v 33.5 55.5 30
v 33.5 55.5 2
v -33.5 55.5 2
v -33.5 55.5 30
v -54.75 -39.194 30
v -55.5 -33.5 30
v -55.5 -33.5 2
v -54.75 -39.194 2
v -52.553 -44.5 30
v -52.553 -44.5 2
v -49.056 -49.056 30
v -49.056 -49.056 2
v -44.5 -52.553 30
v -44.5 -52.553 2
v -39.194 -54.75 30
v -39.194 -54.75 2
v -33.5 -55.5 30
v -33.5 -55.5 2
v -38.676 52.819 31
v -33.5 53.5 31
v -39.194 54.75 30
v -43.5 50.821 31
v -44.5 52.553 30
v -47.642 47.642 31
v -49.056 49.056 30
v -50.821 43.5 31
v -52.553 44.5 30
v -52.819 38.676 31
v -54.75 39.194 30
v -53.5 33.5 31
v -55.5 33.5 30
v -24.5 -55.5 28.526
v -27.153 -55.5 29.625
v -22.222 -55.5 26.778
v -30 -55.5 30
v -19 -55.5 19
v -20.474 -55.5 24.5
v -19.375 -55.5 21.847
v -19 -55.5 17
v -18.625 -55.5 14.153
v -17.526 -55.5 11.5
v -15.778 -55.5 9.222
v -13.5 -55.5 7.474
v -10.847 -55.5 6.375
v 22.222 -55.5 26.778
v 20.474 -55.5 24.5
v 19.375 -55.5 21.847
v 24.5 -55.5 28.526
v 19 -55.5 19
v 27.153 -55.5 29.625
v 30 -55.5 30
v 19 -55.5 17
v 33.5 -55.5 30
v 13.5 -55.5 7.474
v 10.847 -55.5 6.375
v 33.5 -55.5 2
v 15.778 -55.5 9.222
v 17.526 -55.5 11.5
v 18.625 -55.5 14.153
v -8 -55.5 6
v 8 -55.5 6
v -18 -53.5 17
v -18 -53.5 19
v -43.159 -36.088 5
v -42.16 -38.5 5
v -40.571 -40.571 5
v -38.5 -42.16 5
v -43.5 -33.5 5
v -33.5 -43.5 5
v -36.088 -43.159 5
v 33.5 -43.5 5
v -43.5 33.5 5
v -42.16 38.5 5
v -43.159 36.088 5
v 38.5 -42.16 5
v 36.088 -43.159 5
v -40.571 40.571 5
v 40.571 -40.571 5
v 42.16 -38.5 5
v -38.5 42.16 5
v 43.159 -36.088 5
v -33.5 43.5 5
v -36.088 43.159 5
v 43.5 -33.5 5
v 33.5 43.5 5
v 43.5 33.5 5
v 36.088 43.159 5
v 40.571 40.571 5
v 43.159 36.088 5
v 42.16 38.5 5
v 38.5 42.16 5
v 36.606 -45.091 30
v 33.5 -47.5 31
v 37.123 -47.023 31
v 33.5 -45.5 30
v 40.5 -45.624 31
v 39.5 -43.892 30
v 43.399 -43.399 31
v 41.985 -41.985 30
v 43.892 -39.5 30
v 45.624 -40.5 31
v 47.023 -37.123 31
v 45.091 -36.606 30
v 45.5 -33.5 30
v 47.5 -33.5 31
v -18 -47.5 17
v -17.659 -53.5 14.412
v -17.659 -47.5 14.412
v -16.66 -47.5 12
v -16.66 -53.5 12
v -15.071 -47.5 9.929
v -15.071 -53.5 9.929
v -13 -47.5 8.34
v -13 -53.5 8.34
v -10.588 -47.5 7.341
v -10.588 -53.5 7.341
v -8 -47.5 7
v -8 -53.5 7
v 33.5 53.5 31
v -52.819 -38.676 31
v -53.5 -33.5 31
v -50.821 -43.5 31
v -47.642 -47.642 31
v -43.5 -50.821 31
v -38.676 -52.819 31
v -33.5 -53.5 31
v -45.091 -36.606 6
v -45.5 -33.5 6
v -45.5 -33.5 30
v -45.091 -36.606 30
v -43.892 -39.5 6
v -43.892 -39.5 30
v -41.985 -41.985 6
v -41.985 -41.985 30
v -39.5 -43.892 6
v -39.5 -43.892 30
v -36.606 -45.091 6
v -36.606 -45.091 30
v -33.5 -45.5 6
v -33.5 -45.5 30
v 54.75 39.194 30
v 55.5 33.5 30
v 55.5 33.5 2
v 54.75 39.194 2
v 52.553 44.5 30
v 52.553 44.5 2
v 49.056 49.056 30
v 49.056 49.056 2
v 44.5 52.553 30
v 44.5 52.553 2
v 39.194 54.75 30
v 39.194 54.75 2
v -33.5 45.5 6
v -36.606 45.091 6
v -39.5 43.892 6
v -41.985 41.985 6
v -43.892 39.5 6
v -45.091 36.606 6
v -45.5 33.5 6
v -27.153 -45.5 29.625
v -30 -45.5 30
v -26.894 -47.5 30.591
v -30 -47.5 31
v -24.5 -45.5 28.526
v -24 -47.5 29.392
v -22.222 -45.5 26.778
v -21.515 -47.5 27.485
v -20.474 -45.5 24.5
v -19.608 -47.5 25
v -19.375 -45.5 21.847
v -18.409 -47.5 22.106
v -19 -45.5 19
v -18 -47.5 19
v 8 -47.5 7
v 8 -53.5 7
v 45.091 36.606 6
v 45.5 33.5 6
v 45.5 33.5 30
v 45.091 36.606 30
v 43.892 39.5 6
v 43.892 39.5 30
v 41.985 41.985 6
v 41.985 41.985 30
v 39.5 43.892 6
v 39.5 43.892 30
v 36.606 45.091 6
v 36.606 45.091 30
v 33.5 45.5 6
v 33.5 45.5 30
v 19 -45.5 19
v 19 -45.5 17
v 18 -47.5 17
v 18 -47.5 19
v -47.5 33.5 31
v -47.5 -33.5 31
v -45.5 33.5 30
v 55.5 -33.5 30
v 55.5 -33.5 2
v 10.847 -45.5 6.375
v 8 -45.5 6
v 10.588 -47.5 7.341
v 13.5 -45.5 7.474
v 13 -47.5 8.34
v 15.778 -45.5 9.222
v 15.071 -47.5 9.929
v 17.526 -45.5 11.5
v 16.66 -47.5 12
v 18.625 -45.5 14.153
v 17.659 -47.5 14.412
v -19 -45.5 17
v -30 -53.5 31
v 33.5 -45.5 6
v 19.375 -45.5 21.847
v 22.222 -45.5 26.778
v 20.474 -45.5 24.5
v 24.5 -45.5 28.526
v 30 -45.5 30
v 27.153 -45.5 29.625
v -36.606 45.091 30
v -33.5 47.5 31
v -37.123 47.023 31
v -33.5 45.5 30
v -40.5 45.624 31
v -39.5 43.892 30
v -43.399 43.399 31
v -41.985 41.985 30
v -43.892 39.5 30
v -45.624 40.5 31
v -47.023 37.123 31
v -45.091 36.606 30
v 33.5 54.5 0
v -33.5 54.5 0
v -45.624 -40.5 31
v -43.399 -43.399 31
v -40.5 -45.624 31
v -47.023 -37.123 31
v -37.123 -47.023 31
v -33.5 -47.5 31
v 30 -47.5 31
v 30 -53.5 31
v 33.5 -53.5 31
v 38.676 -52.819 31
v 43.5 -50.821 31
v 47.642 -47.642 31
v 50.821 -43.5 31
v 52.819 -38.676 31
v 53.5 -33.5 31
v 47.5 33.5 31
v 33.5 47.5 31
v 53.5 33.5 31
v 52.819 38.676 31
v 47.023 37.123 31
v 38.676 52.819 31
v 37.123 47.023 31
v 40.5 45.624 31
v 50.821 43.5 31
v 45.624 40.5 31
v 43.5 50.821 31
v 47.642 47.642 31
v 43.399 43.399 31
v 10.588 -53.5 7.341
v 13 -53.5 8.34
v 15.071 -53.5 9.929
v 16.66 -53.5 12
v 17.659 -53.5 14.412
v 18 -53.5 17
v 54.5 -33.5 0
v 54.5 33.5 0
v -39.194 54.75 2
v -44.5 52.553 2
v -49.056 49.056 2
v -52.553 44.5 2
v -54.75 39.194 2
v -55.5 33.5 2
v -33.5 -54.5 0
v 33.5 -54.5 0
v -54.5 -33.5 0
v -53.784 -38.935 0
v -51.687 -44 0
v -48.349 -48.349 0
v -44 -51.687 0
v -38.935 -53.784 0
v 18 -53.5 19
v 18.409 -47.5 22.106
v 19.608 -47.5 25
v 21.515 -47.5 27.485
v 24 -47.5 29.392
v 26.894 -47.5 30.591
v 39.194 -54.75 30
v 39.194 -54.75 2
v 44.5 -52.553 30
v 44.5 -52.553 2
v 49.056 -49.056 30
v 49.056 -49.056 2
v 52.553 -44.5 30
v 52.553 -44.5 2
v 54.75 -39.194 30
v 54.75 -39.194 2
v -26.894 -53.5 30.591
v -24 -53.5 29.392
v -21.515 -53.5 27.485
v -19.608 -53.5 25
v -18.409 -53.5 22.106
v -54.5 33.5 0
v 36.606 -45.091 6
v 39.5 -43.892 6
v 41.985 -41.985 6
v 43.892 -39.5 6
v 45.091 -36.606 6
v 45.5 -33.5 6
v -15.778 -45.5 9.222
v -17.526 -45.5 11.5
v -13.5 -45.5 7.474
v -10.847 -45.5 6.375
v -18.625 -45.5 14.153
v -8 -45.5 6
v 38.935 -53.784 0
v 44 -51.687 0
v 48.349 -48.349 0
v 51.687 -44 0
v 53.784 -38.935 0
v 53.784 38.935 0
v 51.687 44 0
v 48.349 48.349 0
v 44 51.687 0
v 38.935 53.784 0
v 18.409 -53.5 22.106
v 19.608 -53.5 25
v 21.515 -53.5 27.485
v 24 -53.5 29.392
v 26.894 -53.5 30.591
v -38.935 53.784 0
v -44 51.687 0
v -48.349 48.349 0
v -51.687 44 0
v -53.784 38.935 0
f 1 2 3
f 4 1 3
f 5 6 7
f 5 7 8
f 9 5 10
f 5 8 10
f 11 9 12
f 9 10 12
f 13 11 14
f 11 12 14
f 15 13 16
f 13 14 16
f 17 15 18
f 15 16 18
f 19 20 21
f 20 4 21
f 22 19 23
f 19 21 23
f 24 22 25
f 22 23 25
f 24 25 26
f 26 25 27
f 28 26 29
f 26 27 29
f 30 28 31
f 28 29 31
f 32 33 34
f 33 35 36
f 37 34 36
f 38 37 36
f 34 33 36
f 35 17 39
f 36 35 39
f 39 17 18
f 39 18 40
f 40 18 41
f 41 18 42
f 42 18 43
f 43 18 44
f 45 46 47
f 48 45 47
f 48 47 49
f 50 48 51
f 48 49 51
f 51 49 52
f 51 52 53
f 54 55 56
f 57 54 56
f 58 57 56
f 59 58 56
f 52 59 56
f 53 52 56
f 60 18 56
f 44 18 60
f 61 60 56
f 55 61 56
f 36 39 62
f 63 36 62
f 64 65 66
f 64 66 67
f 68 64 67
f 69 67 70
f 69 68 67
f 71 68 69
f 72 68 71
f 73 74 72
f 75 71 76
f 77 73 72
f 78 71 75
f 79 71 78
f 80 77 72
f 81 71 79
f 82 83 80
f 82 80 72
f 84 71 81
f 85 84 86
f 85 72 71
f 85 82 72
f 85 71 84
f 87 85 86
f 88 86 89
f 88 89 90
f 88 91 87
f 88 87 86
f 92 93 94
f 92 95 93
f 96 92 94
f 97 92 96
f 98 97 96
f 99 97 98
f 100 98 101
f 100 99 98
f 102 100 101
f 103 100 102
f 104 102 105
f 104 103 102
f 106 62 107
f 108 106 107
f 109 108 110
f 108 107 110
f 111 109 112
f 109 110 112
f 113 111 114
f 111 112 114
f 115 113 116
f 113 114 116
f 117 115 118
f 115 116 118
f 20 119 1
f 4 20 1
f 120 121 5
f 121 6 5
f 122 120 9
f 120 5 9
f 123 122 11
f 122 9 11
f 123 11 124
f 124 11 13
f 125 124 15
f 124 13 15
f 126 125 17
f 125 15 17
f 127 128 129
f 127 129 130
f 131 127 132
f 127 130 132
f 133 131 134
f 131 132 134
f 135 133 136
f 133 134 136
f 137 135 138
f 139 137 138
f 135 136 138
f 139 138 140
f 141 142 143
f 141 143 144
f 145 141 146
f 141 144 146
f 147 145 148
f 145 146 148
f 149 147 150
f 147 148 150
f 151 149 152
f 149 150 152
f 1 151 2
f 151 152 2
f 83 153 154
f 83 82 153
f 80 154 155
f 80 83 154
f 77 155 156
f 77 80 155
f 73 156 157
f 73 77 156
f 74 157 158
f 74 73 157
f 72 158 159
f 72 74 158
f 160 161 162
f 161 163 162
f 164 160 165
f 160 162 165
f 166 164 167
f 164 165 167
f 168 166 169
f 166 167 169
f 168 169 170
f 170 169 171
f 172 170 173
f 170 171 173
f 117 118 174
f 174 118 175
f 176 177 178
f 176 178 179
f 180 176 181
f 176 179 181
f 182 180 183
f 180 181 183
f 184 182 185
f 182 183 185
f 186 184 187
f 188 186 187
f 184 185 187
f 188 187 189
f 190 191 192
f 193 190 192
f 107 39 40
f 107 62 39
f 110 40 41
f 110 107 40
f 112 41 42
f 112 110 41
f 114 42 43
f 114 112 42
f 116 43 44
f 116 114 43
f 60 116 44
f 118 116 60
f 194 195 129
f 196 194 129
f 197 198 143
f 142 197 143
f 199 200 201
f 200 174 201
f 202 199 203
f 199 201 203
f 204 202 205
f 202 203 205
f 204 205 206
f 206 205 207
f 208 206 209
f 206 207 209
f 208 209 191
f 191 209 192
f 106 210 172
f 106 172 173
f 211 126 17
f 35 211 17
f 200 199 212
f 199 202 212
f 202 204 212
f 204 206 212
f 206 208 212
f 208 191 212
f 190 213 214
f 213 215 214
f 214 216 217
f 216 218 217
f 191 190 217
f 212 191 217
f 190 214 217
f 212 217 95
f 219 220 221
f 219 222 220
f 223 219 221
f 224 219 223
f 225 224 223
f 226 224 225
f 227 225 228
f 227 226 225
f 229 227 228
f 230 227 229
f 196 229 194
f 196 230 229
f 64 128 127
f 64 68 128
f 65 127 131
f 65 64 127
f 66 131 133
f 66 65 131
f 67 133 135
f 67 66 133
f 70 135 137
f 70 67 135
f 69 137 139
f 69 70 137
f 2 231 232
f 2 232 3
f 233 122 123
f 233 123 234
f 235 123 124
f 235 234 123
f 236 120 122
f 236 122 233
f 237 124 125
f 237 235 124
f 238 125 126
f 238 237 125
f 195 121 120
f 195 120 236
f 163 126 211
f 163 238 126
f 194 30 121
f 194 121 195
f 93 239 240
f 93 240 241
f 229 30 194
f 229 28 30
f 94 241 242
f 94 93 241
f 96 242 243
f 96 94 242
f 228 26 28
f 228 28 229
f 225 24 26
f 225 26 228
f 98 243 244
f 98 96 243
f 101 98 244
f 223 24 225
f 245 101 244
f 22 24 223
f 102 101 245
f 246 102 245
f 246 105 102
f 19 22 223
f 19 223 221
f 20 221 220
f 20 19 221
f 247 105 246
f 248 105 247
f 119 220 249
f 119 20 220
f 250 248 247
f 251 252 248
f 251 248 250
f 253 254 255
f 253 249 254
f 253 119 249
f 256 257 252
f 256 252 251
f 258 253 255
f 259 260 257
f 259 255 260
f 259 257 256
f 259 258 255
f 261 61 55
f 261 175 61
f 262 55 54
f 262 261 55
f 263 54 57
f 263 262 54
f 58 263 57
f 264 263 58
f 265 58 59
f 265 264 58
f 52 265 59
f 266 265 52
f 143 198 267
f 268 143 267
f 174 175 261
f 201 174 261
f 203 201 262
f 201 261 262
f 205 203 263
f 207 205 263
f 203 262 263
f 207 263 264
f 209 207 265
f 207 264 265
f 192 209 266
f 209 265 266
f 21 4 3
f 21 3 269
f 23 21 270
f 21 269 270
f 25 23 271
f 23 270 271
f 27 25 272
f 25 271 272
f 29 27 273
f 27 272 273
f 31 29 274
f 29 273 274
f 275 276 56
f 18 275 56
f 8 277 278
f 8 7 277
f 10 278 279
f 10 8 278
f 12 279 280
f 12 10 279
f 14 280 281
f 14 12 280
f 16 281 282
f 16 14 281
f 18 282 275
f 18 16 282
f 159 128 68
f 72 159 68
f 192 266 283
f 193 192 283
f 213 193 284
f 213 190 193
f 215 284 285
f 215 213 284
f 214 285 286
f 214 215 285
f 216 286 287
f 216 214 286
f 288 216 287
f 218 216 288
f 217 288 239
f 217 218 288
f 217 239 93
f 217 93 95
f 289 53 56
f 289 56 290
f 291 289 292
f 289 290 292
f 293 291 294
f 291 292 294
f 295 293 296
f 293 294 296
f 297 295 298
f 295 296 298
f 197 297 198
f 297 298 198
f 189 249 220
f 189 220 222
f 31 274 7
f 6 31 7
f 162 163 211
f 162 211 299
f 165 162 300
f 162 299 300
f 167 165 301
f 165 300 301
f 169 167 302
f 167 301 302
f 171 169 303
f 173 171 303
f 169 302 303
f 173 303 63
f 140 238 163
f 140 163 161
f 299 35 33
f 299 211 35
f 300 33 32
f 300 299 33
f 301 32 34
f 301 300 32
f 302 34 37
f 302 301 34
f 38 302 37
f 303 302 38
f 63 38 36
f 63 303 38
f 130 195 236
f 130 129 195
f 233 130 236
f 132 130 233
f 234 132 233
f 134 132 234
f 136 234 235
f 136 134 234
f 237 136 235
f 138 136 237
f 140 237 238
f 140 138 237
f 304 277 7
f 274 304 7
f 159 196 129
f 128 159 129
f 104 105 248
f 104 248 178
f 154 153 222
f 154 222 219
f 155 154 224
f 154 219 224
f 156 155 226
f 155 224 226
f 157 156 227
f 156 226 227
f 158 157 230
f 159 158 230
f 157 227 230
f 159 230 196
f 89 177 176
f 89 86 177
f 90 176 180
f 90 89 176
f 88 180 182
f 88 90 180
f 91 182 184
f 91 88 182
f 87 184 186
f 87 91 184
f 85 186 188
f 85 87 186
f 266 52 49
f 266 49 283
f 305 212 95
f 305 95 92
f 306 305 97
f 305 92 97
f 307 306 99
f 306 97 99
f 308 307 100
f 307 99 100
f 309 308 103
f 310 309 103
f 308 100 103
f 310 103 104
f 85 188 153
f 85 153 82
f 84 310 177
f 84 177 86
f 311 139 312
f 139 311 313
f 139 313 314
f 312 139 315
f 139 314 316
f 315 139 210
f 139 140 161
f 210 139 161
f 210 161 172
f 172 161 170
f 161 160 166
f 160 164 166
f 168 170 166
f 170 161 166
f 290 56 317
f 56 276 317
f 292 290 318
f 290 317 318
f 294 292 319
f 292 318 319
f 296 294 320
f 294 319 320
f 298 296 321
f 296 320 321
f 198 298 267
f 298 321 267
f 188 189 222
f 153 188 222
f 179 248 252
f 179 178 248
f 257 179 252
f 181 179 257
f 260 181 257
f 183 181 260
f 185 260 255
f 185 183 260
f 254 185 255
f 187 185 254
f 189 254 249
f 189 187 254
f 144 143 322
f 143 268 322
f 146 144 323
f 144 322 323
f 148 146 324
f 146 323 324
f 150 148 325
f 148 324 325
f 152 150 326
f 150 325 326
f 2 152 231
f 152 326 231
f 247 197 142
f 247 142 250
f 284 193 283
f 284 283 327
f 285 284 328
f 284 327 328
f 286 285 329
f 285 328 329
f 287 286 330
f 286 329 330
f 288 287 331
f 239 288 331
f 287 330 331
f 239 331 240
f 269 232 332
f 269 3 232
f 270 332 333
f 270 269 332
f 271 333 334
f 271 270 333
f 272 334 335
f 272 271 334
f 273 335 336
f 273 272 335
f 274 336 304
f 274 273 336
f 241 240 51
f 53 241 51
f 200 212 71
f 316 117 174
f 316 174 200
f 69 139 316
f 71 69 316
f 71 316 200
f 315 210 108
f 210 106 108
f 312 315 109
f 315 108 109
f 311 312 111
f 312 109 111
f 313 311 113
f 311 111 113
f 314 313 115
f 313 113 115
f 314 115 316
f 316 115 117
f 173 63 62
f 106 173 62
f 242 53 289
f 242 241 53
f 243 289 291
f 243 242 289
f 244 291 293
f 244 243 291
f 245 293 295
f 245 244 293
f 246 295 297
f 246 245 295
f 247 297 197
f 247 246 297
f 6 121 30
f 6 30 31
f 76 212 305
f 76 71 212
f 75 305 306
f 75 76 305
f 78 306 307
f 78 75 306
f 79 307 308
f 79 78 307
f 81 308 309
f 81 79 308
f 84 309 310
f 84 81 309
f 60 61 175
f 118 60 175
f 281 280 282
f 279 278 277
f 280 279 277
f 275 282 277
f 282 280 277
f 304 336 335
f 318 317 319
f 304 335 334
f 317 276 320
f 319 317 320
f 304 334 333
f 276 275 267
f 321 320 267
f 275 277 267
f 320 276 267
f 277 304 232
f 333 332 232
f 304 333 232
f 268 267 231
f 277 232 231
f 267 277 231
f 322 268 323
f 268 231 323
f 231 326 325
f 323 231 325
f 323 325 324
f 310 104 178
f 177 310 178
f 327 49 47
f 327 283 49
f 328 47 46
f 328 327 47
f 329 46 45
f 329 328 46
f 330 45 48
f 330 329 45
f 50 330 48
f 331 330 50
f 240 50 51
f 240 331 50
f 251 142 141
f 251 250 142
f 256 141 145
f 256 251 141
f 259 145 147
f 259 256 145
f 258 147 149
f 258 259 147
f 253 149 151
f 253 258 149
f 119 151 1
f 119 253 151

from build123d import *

# Parameters (mm, degrees)
F1_DEPTH     = 31
F3_DEPTH     = 26
F5_DEPTH     = 10
F6_T1_DEPTH  = 67
F6_T3_DEPTH  = 67
F6_T6_ANGLE  = 90
F6_T8_ANGLE  = 90
F6_T10_ANGLE = 90
F6_T12_ANGLE = 90
F6_T13_DEPTH = 67
F6_T15_DEPTH = 67
F6_T17_DEPTH = 3.5
F6_T19_DEPTH = 3.5
F6_T21_DEPTH = 2
F6_T23_DEPTH = 16
F6_T26_ANGLE = 90
F6_T28_ANGLE = 90
F6_T30_ANGLE = 90
F6_T32_ANGLE = 90
F6_T34_ANGLE = 90
F6_T36_ANGLE = 90
F6_T38_ANGLE = 90
F6_T40_ANGLE = 90
F6_T42_ANGLE = 90
F6_T44_ANGLE = 90
F6_T46_ANGLE = 90
F6_T48_ANGLE = 90
F6_T50_ANGLE = 90
F6_T52_ANGLE = 90
F6_T54_ANGLE = 90
F6_T56_ANGLE = 90
F6_T58_ANGLE = 90
F6_T60_ANGLE = 90
F6_T62_ANGLE = 90
F6_T64_ANGLE = 90


# Not quite as in the source:
# - a fillet or chamfer that OpenCascade refuses, or shapes differently, is made with other operations: its cross-section is extruded or revolved along the edge and cut away or added


with BuildPart() as f1:
    # F0 (on Top) → F1 (new body)
    with BuildSketch(Plane.XY):
        with BuildLine():
            Line((55.5, -33.5), (55.5, 33.5))
            ThreePointArc((55.5, 33.5), (49.0563491861, 49.0563491861), (33.5, 55.5))
            Line((33.5, 55.5), (-33.5, 55.5))
            ThreePointArc((-33.5, 55.5), (-49.0563491861, 49.0563491861), (-55.5, 33.5))
            Line((-55.5, 33.5), (-55.5, -33.5))
            ThreePointArc((-55.5, -33.5), (-49.0563491861, -49.0563491861), (-33.5, -55.5))
            Line((-33.5, -55.5), (33.5, -55.5))
            ThreePointArc((33.5, -55.5), (49.0563491861, -49.0563491861), (55.5, -33.5))
        make_face()
    extrude(amount=F1_DEPTH)

    # F2 (on face) → F3 (cut, through all)
    with BuildSketch(Plane.XY.offset(31)):
        with BuildLine():
            Line((33.5, 45.5), (-33.5, 45.5))
            ThreePointArc((-33.5, 45.5), (-41.9852813742, 41.9852813742), (-45.5, 33.5))
            Line((-45.5, 33.5), (-45.5, -33.5))
            ThreePointArc((-45.5, -33.5), (-41.9852813742, -41.9852813742), (-33.5, -45.5))
            Line((-33.5, -45.5), (33.5, -45.5))
            ThreePointArc((33.5, -45.5), (41.9852813742, -41.9852813742), (45.5, -33.5))
            Line((45.5, -33.5), (45.5, 33.5))
            ThreePointArc((45.5, 33.5), (41.9852813742, 41.9852813742), (33.5, 45.5))
        make_face()
    extrude(amount=-F3_DEPTH, mode=Mode.SUBTRACT)

    # F4 (on face) → F5 (cut, through all)
    with BuildSketch(Plane.XZ.offset(55.5)):
        with BuildLine():
            ThreePointArc((-30, 31), (-21.5147186258, 27.4852813742), (-18, 19))
            Line((-18, 19), (-18, 17))
            ThreePointArc((-18, 17), (-15.0710678119, 9.9289321881), (-8, 7))
            Line((-8, 7), (8, 7))
            ThreePointArc((8, 7), (15.0710678119, 9.9289321881), (18, 17))
            Line((18, 17), (18, 19))
            ThreePointArc((18, 19), (21.5147186258, 27.4852813742), (30, 31))
            Line((30, 31), (-30, 31))
        make_face()
    extrude(amount=-F5_DEPTH, mode=Mode.SUBTRACT)

    # F6: chamfer of 2 x 1 on 48 edges, made by hand

    # F6_s2 → F6_t1 (join)
    with BuildSketch(Plane.XZ.offset(-33.5)):
        Polygon((-45.5, 6), (-43.5, 5), (-45.5, 5), align=None)
        Polygon((45.5, 6), (43.5, 5), (45.5, 5), align=None)
    extrude(amount=F6_T1_DEPTH)

    # F6_s4 → F6_t3 (join)
    with BuildSketch(Plane.YZ.offset(-33.5)):
        Polygon((-45.5, 6), (-43.5, 5), (-45.5, 5), align=None)
        Polygon((45.5, 6), (43.5, 5), (45.5, 5), align=None)
    extrude(amount=F6_T3_DEPTH)

    # F6_s5 → F6_t6 (revolve)
    with BuildSketch(Plane.YZ.offset(33.5)):
        Polygon((-45.5, 6), (-43.5, 5), (-45.5, 5), align=None)
    revolve(axis=Axis((33.5, -33.5, 5), (0, 0, 1)), revolution_arc=F6_T6_ANGLE)

    # F6_s7 → F6_t8 (revolve)
    with BuildSketch(Plane.XZ.offset(-33.5)):
        Polygon((45.5, 6), (43.5, 5), (45.5, 5), align=None)
    revolve(axis=Axis((33.5, 33.5, 5), (0, 0, 1)), revolution_arc=F6_T8_ANGLE)

    # F6_s9 → F6_t10 (revolve)
    with BuildSketch(Plane.YZ.offset(-33.5)):
        Polygon((45.5, 6), (43.5, 5), (45.5, 5), align=None)
    revolve(axis=Axis((-33.5, 33.5, 5), (0, 0, 1)), revolution_arc=F6_T10_ANGLE)

    # F6_s11 → F6_t12 (revolve)
    with BuildSketch(Plane.XZ.offset(33.5)):
        Polygon((-45.5, 6), (-43.5, 5), (-45.5, 5), align=None)
    revolve(axis=Axis((-33.5, -33.5, 5), (0, 0, 1)), revolution_arc=F6_T12_ANGLE)

    # F6_s14 → F6_t13 (cut)
    with BuildSketch(Plane.YZ.offset(-33.5)):
        Polygon((47.5, 31), (45.5, 30), (45.5, 31), align=None)
        Polygon((53.5, 31), (55.5, 30), (55.5, 31), align=None)
        Polygon((-54.5, 0), (-55.5, 2), (-55.5, 0), align=None)
        Polygon((54.5, 0), (55.5, 2), (55.5, 0), align=None)
    extrude(amount=F6_T13_DEPTH, mode=Mode.SUBTRACT)

    # F6_s16 → F6_t15 (cut)
    with BuildSketch(Plane.XZ.offset(-33.5)):
        Polygon((55.5, 2), (54.5, 0), (55.5, 0), align=None)
        Polygon((55.5, 30), (53.5, 31), (55.5, 31), align=None)
        Polygon((-54.5, 0), (-55.5, 2), (-55.5, 0), align=None)
        Polygon((47.5, 31), (45.5, 30), (45.5, 31), align=None)
        Polygon((-47.5, 31), (-45.5, 30), (-45.5, 31), align=None)
        Polygon((-53.5, 31), (-55.5, 30), (-55.5, 31), align=None)
    extrude(amount=F6_T15_DEPTH, mode=Mode.SUBTRACT)

    # F6_s18 → F6_t17 (cut)
    with BuildSketch(Plane.YZ.offset(30)):
        Polygon((-53.5, 31), (-55.5, 30), (-55.5, 31), align=None)
        Polygon((-47.5, 31), (-45.5, 30), (-45.5, 31), align=None)
    extrude(amount=F6_T17_DEPTH, mode=Mode.SUBTRACT)

    # F6_s20 → F6_t19 (cut)
    with BuildSketch(Plane.YZ.offset(-33.5)):
        Polygon((-47.5, 31), (-45.5, 30), (-45.5, 31), align=None)
        Polygon((-53.5, 31), (-55.5, 30), (-55.5, 31), align=None)
    extrude(amount=F6_T19_DEPTH, mode=Mode.SUBTRACT)

    # F6_s22 → F6_t21 (cut)
    with BuildSketch(Plane.XY.offset(17)):
        Polygon((19, -55.5), (18, -53.5), (18, -55.5), align=None)
        Polygon((-19, -55.5), (-18, -53.5), (-18, -55.5), align=None)
        Polygon((-19, -45.5), (-18, -47.5), (-18, -45.5), align=None)
        Polygon((19, -45.5), (18, -47.5), (18, -45.5), align=None)
    extrude(amount=F6_T21_DEPTH, mode=Mode.SUBTRACT)

    # F6_s24 → F6_t23 (cut)
    with BuildSketch(Plane.YZ.offset(-8)):
        Polygon((-55.5, 6), (-53.5, 7), (-55.5, 7), align=None)
        Polygon((-45.5, 6), (-47.5, 7), (-45.5, 7), align=None)
    extrude(amount=F6_T23_DEPTH, mode=Mode.SUBTRACT)

    # F6_s25 → F6_t26 (revolve, cut)
    with BuildSketch(Plane.YZ.offset(33.5)):
        Polygon((-55.5, 2), (-54.5, 0), (-55.5, 0), align=None)
    revolve(axis=Axis((33.5, -33.5, 0), (0, 0, 1)), revolution_arc=F6_T26_ANGLE, mode=Mode.SUBTRACT)

    # F6_s27 → F6_t28 (revolve, cut)
    with BuildSketch(Plane.YZ.offset(33.5)):
        Polygon((-55.5, 30), (-53.5, 31), (-55.5, 31), align=None)
    revolve(axis=Axis((33.5, -33.5, 31), (0, 0, 1)), revolution_arc=F6_T28_ANGLE, mode=Mode.SUBTRACT)

    # F6_s29 → F6_t30 (revolve, cut)
    with BuildSketch(Plane.XZ.offset(-33.5)):
        Polygon((55.5, 2), (54.5, 0), (55.5, 0), align=None)
    revolve(axis=Axis((33.5, 33.5, 0), (0, 0, 1)), revolution_arc=F6_T30_ANGLE, mode=Mode.SUBTRACT)

    # F6_s31 → F6_t32 (revolve, cut)
    with BuildSketch(Plane.XZ.offset(-33.5)):
        Polygon((55.5, 30), (53.5, 31), (55.5, 31), align=None)
    revolve(axis=Axis((33.5, 33.5, 31), (0, 0, 1)), revolution_arc=F6_T32_ANGLE, mode=Mode.SUBTRACT)

    # F6_s33 → F6_t34 (revolve, cut)
    with BuildSketch(Plane.YZ.offset(-33.5)):
        Polygon((54.5, 0), (55.5, 2), (55.5, 0), align=None)
    revolve(axis=Axis((-33.5, 33.5, 0), (0, 0, 1)), revolution_arc=F6_T34_ANGLE, mode=Mode.SUBTRACT)

    # F6_s35 → F6_t36 (revolve, cut)
    with BuildSketch(Plane.XZ.offset(33.5)):
        Polygon((-54.5, 0), (-55.5, 2), (-55.5, 0), align=None)
    revolve(axis=Axis((-33.5, -33.5, 0), (0, 0, 1)), revolution_arc=F6_T36_ANGLE, mode=Mode.SUBTRACT)

    # F6_s37 → F6_t38 (revolve, cut)
    with BuildSketch(Plane.YZ.offset(33.5)):
        Polygon((-47.5, 31), (-45.5, 30), (-45.5, 31), align=None)
    revolve(axis=Axis((33.5, -33.5, 31), (0, 0, 1)), revolution_arc=F6_T38_ANGLE, mode=Mode.SUBTRACT)

    # F6_s39 → F6_t40 (revolve, cut)
    with BuildSketch(Plane.XZ.offset(-33.5)):
        Polygon((47.5, 31), (45.5, 30), (45.5, 31), align=None)
    revolve(axis=Axis((33.5, 33.5, 31), (0, 0, 1)), revolution_arc=F6_T40_ANGLE, mode=Mode.SUBTRACT)

    # F6_s41 → F6_t42 (revolve, cut)
    with BuildSketch(Plane.YZ.offset(-33.5)):
        Polygon((47.5, 31), (45.5, 30), (45.5, 31), align=None)
    revolve(axis=Axis((-33.5, 33.5, 31), (0, 0, 1)), revolution_arc=F6_T42_ANGLE, mode=Mode.SUBTRACT)

    # F6_s43 → F6_t44 (revolve, cut)
    with BuildSketch(Plane.XZ.offset(33.5)):
        Polygon((-47.5, 31), (-45.5, 30), (-45.5, 31), align=None)
    revolve(axis=Axis((-33.5, -33.5, 31), (0, 0, 1)), revolution_arc=F6_T44_ANGLE, mode=Mode.SUBTRACT)

    # F6_s45 → F6_t46 (revolve, cut)
    with BuildSketch(Plane.XZ.offset(33.5)):
        Polygon((-53.5, 31), (-55.5, 30), (-55.5, 31), align=None)
    revolve(axis=Axis((-33.5, -33.5, 31), (0, 0, 1)), revolution_arc=F6_T46_ANGLE, mode=Mode.SUBTRACT)

    # F6_s47 → F6_t48 (revolve, cut)
    with BuildSketch(Plane.YZ.offset(-33.5)):
        Polygon((53.5, 31), (55.5, 30), (55.5, 31), align=None)
    revolve(axis=Axis((-33.5, 33.5, 31), (0, 0, 1)), revolution_arc=F6_T48_ANGLE, mode=Mode.SUBTRACT)

    # F6_s49 → F6_t50 (revolve, cut)
    with BuildSketch(Plane.XY.offset(19)):
        Polygon((19, -55.5), (18, -53.5), (18, -55.5), align=None)
    revolve(axis=Axis((30, -55.5, 19), (0, 1, 0)), revolution_arc=F6_T50_ANGLE, mode=Mode.SUBTRACT)

    # F6_s51 → F6_t52 (revolve, cut)
    with BuildSketch(Plane.YZ.offset(8)):
        Polygon((-55.5, 6), (-53.5, 7), (-55.5, 7), align=None)
    revolve(axis=Axis((8, -55.5, 17), (0, -1, 0)), revolution_arc=F6_T52_ANGLE, mode=Mode.SUBTRACT)

    # F6_s53 → F6_t54 (revolve, cut)
    with BuildSketch(Plane.XY.offset(17)):
        Polygon((-19, -55.5), (-18, -53.5), (-18, -55.5), align=None)
    revolve(axis=Axis((-8, -55.5, 17), (0, -1, 0)), revolution_arc=F6_T54_ANGLE, mode=Mode.SUBTRACT)

    # F6_s55 → F6_t56 (revolve, cut)
    with BuildSketch(Plane.YZ.offset(-30)):
        Polygon((-55.5, 30), (-53.5, 31), (-55.5, 31), align=None)
    revolve(axis=Axis((-30, -55.5, 19), (0, 1, 0)), revolution_arc=F6_T56_ANGLE, mode=Mode.SUBTRACT)

    # F6_s57 → F6_t58 (revolve, cut)
    with BuildSketch(Plane.XY.offset(19)):
        Polygon((18, -47.5), (19, -45.5), (18, -45.5), align=None)
    revolve(axis=Axis((30, -45.5, 19), (0, 1, 0)), revolution_arc=F6_T58_ANGLE, mode=Mode.SUBTRACT)

    # F6_s59 → F6_t60 (revolve, cut)
    with BuildSketch(Plane.YZ.offset(-30)):
        Polygon((-45.5, 30), (-47.5, 31), (-45.5, 31), align=None)
    revolve(axis=Axis((-30, -45.5, 19), (0, 1, 0)), revolution_arc=F6_T60_ANGLE, mode=Mode.SUBTRACT)

    # F6_s61 → F6_t62 (revolve, cut)
    with BuildSketch(Plane.XY.offset(17)):
        Polygon((-19, -45.5), (-18, -47.5), (-18, -45.5), align=None)
    revolve(axis=Axis((-8, -45.5, 17), (0, -1, 0)), revolution_arc=F6_T62_ANGLE, mode=Mode.SUBTRACT)

    # F6_s63 → F6_t64 (revolve, cut)
    with BuildSketch(Plane.YZ.offset(8)):
        Polygon((-45.5, 6), (-47.5, 7), (-45.5, 7), align=None)
    revolve(axis=Axis((8, -45.5, 17), (0, -1, 0)), revolution_arc=F6_T64_ANGLE, mode=Mode.SUBTRACT)


solid = f1.part
